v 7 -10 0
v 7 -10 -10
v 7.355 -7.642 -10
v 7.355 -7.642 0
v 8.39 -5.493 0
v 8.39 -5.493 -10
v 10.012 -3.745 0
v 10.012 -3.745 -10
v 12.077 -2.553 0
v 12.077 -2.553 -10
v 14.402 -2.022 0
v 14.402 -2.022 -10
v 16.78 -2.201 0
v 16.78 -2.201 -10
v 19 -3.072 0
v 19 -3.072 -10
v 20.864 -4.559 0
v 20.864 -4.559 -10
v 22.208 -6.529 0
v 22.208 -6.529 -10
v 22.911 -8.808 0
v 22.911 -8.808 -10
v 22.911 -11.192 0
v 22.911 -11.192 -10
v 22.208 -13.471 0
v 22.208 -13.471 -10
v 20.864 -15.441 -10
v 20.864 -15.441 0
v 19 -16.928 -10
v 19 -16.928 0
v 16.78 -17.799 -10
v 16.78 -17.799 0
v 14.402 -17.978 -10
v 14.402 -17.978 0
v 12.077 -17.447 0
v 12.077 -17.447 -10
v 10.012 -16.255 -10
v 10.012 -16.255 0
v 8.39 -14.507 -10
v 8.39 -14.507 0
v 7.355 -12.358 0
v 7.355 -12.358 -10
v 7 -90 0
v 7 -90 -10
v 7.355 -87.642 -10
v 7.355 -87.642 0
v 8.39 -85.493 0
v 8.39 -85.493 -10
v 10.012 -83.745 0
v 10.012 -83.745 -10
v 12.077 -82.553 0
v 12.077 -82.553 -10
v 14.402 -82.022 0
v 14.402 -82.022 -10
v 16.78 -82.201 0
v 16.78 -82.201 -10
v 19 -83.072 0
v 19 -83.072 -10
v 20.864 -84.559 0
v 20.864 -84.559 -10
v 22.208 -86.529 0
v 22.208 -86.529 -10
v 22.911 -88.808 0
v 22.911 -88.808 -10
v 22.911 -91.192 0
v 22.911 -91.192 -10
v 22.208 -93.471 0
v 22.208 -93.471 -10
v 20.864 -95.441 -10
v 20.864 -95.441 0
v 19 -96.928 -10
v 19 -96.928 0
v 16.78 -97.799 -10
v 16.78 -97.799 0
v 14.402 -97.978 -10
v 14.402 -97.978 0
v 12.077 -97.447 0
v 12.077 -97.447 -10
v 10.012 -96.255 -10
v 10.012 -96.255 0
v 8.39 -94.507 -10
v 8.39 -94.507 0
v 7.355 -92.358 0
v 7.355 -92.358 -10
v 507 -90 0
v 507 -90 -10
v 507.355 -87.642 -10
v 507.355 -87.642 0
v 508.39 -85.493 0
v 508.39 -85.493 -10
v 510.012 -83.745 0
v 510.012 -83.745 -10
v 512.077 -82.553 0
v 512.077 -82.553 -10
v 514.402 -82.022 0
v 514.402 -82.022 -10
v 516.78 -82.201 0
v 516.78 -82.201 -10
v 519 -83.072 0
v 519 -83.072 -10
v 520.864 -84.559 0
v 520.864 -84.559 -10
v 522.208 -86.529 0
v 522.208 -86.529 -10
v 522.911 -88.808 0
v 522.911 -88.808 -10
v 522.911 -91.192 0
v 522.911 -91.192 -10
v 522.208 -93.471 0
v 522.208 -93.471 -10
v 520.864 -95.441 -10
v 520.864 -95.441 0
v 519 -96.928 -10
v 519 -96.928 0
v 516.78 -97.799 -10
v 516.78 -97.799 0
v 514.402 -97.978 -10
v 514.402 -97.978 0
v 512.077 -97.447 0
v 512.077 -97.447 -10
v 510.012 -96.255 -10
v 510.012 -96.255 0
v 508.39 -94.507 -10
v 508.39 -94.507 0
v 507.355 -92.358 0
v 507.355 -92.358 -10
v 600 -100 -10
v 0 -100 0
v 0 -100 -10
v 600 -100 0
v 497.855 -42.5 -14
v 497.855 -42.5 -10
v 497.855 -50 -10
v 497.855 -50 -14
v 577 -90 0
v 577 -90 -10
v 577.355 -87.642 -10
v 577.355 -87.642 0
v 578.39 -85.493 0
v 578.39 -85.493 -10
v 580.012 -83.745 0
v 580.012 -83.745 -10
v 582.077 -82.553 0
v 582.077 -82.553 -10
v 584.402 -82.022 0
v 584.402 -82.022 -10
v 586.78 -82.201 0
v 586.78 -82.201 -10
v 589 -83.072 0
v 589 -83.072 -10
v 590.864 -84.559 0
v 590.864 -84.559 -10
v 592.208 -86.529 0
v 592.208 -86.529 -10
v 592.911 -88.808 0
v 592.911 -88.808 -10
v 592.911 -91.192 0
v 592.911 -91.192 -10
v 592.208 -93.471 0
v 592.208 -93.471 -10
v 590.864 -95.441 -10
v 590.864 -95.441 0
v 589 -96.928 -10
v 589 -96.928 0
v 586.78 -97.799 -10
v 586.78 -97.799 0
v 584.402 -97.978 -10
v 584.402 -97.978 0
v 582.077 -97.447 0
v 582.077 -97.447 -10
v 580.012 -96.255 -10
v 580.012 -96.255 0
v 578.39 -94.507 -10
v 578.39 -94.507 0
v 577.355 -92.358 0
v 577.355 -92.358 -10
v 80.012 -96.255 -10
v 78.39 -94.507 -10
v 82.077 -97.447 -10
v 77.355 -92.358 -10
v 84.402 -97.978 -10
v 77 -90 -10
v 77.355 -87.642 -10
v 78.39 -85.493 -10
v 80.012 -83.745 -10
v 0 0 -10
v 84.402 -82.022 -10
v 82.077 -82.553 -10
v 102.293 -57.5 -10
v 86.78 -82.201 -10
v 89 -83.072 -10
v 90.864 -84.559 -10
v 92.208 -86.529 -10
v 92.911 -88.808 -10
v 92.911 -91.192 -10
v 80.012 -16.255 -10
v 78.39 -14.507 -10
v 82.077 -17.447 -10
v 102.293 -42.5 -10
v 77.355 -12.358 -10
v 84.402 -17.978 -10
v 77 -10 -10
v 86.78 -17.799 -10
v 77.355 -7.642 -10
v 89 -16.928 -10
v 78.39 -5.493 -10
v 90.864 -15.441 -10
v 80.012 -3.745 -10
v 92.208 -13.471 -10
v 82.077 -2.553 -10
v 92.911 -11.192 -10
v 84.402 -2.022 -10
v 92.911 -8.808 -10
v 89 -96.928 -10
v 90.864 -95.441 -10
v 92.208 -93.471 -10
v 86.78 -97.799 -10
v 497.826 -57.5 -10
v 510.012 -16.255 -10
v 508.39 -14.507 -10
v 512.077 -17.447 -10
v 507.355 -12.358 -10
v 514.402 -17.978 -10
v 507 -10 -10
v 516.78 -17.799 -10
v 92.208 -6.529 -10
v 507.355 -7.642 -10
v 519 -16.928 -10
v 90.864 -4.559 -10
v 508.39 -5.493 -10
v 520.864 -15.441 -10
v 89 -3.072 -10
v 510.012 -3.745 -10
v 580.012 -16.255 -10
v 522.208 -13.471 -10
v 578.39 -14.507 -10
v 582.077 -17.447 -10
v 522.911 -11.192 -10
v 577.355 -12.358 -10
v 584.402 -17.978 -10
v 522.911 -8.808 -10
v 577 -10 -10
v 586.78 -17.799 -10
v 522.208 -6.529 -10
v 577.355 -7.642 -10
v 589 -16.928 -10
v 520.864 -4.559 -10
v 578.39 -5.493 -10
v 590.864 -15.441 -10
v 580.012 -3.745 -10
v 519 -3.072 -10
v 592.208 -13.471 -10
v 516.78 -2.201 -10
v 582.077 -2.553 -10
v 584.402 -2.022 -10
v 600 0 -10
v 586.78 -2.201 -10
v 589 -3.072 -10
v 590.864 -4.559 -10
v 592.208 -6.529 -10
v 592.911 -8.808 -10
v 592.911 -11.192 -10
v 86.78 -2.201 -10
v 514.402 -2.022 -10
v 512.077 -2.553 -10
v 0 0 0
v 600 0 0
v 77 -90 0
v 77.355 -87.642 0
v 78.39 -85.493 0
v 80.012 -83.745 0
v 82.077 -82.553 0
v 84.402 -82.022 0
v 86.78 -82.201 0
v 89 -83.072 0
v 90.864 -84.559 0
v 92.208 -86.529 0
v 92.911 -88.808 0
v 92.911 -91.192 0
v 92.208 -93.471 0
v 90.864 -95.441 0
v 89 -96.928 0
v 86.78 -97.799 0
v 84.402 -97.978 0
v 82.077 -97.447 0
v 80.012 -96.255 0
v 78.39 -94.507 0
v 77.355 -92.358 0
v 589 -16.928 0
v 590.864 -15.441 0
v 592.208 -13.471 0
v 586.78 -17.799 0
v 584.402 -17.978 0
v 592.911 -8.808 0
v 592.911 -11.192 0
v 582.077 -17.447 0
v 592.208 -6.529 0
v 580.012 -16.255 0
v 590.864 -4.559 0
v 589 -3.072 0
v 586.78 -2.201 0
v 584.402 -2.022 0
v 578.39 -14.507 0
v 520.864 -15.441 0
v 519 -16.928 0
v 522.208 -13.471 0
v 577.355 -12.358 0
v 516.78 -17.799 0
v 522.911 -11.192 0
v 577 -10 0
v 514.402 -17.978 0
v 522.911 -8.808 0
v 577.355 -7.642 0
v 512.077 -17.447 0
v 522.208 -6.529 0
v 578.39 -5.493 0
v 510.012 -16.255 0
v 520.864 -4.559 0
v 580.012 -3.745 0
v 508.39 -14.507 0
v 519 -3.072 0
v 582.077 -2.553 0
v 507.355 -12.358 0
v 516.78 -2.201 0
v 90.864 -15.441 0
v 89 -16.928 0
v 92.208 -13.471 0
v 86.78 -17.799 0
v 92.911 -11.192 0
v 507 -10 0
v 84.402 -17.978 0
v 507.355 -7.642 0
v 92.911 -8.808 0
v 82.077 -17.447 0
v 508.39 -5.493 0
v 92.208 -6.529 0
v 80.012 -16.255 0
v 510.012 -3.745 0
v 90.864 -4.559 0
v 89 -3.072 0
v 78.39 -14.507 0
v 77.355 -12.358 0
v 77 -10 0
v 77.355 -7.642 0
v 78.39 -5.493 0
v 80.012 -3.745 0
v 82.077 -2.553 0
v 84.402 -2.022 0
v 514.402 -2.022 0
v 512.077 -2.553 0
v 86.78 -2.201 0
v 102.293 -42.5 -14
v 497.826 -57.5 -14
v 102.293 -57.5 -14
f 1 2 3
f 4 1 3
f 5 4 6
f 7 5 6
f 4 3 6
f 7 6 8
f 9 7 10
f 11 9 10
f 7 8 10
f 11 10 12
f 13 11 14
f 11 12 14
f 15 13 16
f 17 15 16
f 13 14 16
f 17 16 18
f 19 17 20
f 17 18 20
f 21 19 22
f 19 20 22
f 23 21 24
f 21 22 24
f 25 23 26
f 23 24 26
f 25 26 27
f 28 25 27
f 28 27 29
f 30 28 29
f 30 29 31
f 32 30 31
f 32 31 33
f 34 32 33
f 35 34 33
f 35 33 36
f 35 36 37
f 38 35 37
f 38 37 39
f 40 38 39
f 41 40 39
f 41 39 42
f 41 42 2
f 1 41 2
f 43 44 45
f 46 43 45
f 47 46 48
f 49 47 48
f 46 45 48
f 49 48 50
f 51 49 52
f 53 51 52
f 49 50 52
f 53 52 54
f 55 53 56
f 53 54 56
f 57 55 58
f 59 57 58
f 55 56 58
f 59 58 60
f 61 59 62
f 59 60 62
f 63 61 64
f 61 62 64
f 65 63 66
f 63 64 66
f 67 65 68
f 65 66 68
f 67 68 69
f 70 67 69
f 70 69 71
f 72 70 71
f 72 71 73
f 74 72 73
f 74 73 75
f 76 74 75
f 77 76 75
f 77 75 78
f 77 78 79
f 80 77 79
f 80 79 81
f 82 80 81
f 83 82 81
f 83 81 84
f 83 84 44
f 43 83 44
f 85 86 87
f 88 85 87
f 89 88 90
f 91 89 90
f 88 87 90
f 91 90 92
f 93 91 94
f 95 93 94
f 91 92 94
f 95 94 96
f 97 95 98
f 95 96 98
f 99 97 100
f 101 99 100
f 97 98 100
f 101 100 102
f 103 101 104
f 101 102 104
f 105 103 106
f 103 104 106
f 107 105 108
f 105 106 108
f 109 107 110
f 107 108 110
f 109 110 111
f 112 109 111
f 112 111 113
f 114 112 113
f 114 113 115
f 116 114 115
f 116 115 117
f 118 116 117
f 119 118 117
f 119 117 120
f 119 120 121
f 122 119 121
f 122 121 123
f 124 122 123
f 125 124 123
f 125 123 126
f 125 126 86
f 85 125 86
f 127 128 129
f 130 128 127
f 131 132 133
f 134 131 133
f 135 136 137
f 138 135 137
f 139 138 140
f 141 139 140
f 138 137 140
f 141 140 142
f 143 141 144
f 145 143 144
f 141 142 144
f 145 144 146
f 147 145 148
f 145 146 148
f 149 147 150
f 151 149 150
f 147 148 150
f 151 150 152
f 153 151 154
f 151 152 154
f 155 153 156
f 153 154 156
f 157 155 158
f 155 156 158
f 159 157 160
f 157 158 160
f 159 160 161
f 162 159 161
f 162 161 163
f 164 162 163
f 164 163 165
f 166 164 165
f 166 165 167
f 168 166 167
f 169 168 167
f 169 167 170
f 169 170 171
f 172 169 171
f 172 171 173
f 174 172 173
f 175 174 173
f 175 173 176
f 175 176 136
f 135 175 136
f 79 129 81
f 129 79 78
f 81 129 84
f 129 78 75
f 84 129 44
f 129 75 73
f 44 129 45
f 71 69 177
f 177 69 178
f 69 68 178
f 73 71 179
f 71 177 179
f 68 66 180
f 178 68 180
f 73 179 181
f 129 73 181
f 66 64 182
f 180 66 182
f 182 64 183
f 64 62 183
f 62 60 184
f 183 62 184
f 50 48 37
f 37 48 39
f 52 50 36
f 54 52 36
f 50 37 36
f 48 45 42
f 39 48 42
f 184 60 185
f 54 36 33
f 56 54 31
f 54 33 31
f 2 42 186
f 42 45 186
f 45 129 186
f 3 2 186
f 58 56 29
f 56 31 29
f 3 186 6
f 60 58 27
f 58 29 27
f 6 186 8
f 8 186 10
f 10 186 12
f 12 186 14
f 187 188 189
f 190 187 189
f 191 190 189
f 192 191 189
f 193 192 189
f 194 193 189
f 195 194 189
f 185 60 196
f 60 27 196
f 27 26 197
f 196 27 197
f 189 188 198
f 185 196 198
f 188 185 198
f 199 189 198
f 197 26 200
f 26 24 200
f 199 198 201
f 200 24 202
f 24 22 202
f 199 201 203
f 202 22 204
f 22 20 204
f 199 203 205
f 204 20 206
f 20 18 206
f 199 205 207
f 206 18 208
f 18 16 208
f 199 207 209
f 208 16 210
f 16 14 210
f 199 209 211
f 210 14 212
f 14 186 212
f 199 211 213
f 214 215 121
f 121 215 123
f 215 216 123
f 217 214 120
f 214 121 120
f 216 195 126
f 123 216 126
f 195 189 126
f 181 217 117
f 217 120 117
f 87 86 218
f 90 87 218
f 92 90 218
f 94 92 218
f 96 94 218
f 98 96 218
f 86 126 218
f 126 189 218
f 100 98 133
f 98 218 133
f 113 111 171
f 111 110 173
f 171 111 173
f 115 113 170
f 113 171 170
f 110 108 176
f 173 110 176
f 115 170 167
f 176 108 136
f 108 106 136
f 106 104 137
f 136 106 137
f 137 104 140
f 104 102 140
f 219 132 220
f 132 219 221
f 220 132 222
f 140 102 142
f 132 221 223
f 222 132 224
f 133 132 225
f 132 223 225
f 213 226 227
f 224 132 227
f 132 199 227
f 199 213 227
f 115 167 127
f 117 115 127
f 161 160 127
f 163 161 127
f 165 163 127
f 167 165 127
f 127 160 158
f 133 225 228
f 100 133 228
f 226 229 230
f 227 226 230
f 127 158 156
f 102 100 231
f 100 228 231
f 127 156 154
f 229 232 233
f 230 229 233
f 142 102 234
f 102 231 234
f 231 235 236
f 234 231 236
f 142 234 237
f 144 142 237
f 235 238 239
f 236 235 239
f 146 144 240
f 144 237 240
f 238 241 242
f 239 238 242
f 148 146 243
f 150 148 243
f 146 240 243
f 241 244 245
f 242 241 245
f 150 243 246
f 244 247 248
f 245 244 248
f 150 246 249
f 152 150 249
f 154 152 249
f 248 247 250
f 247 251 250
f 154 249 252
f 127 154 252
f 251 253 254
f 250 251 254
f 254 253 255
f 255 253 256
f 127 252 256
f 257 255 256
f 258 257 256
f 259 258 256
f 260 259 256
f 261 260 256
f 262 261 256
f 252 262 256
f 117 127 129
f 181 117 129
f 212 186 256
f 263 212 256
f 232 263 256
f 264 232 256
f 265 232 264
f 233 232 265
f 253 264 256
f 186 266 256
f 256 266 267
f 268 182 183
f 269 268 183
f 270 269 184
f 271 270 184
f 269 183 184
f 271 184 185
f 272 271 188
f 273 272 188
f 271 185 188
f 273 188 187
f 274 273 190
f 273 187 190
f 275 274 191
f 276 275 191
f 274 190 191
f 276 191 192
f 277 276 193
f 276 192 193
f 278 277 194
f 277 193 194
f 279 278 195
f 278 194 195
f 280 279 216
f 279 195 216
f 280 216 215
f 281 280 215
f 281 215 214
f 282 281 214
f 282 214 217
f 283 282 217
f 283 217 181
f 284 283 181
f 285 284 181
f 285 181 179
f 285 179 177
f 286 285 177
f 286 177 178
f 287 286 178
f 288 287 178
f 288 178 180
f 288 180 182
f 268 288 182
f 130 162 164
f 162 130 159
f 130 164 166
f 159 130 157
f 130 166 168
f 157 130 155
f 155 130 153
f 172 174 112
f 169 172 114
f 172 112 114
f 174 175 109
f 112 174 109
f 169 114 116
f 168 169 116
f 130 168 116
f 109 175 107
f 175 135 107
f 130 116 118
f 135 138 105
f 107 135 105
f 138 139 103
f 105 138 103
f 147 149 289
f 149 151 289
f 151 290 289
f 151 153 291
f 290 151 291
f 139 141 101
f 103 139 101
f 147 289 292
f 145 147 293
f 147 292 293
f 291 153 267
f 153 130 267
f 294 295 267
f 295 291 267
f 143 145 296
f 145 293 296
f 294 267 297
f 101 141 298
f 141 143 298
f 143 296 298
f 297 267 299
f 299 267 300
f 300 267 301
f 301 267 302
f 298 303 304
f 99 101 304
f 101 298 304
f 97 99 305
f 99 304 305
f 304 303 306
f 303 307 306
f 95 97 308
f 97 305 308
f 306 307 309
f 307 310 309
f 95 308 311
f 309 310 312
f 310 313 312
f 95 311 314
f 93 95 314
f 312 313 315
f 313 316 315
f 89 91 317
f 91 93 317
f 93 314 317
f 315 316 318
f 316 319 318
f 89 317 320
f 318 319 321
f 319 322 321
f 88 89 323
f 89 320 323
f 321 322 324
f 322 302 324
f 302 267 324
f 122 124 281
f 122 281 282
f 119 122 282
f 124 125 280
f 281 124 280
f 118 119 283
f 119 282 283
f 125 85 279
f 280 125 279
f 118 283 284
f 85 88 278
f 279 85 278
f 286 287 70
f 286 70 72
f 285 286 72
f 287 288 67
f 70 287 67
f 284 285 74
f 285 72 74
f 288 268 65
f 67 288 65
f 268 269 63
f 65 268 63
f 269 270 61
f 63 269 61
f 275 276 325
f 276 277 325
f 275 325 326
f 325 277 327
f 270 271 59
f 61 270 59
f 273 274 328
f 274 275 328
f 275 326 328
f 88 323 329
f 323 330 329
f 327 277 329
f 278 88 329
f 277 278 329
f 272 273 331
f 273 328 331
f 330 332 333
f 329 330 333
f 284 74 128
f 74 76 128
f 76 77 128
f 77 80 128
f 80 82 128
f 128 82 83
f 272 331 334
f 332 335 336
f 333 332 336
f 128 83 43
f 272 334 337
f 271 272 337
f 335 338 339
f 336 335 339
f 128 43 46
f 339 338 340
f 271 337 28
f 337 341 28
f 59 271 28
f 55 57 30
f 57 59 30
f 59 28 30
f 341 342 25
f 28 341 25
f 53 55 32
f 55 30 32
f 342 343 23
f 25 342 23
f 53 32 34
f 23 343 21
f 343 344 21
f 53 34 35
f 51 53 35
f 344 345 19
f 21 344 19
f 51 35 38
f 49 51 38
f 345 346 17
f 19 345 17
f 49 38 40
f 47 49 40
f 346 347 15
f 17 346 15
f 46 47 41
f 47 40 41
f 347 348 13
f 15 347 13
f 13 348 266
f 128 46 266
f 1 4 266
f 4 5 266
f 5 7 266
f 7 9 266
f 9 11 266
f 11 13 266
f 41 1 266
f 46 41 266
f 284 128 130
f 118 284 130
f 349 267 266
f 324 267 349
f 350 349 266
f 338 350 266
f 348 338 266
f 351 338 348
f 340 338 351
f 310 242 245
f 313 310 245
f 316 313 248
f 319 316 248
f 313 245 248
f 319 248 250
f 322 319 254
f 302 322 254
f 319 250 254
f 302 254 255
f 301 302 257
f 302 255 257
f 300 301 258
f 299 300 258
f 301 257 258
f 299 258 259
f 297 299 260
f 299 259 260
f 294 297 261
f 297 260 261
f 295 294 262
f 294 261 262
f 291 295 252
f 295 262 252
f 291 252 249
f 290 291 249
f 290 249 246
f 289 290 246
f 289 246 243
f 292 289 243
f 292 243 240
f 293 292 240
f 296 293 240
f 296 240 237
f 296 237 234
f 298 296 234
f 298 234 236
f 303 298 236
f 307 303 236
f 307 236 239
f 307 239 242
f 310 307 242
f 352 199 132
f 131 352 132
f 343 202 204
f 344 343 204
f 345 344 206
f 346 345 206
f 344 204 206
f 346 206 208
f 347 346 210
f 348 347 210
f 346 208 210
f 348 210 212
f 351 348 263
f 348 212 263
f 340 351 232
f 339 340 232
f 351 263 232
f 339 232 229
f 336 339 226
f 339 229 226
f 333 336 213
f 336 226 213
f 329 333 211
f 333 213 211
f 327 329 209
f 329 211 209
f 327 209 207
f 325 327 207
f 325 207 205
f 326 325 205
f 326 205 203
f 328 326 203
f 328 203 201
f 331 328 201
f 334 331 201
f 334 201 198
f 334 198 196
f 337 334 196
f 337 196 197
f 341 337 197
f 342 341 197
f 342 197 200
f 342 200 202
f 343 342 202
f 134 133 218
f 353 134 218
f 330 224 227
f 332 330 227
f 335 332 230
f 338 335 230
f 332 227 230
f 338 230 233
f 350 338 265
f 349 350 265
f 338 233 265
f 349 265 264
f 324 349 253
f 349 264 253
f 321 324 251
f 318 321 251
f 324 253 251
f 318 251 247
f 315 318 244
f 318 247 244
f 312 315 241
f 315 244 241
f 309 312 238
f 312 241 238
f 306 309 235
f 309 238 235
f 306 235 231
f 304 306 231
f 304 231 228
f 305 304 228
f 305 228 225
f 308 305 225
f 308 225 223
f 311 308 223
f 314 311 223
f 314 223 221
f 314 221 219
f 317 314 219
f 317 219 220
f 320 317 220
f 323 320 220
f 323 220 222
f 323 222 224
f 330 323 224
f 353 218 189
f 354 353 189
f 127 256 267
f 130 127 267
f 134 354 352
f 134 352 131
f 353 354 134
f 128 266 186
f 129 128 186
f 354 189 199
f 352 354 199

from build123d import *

# Parameters (mm, degrees)
F1_DEPTH = 100
F3_D     = 16
F5_DEPTH = 4


with BuildPart() as f1:
    # F0 (on Front) → F1 (new body)
    with BuildSketch(Plane.XZ):
        Polygon((600, 0), (0, 0), (0, -10), (70, -10), (530, -10), (600, -10), align=None)
    extrude(amount=F1_DEPTH)

    # F3 (through all)
    with Locations(Plane.XY):
        with Locations((15, -10), (15, -90), (85, -10), (85, -90), (515, -10), (515, -90), (585, -90), (585, -10)):
            Hole(F3_D / 2)

    # F4 (on face) → F5 (join)
    with BuildSketch(Plane(origin=(0, 0, -10), x_dir=(1, 0, 0), z_dir=(0, 0, -1))):
        Polygon((102.29281, 57.5), (102.29281, 50), (102.29281, 42.5), (497.85471, 42.5), (497.85471, 50), (497.826087, 57.499945), align=None)
    extrude(amount=F5_DEPTH)


solid = f1.part
